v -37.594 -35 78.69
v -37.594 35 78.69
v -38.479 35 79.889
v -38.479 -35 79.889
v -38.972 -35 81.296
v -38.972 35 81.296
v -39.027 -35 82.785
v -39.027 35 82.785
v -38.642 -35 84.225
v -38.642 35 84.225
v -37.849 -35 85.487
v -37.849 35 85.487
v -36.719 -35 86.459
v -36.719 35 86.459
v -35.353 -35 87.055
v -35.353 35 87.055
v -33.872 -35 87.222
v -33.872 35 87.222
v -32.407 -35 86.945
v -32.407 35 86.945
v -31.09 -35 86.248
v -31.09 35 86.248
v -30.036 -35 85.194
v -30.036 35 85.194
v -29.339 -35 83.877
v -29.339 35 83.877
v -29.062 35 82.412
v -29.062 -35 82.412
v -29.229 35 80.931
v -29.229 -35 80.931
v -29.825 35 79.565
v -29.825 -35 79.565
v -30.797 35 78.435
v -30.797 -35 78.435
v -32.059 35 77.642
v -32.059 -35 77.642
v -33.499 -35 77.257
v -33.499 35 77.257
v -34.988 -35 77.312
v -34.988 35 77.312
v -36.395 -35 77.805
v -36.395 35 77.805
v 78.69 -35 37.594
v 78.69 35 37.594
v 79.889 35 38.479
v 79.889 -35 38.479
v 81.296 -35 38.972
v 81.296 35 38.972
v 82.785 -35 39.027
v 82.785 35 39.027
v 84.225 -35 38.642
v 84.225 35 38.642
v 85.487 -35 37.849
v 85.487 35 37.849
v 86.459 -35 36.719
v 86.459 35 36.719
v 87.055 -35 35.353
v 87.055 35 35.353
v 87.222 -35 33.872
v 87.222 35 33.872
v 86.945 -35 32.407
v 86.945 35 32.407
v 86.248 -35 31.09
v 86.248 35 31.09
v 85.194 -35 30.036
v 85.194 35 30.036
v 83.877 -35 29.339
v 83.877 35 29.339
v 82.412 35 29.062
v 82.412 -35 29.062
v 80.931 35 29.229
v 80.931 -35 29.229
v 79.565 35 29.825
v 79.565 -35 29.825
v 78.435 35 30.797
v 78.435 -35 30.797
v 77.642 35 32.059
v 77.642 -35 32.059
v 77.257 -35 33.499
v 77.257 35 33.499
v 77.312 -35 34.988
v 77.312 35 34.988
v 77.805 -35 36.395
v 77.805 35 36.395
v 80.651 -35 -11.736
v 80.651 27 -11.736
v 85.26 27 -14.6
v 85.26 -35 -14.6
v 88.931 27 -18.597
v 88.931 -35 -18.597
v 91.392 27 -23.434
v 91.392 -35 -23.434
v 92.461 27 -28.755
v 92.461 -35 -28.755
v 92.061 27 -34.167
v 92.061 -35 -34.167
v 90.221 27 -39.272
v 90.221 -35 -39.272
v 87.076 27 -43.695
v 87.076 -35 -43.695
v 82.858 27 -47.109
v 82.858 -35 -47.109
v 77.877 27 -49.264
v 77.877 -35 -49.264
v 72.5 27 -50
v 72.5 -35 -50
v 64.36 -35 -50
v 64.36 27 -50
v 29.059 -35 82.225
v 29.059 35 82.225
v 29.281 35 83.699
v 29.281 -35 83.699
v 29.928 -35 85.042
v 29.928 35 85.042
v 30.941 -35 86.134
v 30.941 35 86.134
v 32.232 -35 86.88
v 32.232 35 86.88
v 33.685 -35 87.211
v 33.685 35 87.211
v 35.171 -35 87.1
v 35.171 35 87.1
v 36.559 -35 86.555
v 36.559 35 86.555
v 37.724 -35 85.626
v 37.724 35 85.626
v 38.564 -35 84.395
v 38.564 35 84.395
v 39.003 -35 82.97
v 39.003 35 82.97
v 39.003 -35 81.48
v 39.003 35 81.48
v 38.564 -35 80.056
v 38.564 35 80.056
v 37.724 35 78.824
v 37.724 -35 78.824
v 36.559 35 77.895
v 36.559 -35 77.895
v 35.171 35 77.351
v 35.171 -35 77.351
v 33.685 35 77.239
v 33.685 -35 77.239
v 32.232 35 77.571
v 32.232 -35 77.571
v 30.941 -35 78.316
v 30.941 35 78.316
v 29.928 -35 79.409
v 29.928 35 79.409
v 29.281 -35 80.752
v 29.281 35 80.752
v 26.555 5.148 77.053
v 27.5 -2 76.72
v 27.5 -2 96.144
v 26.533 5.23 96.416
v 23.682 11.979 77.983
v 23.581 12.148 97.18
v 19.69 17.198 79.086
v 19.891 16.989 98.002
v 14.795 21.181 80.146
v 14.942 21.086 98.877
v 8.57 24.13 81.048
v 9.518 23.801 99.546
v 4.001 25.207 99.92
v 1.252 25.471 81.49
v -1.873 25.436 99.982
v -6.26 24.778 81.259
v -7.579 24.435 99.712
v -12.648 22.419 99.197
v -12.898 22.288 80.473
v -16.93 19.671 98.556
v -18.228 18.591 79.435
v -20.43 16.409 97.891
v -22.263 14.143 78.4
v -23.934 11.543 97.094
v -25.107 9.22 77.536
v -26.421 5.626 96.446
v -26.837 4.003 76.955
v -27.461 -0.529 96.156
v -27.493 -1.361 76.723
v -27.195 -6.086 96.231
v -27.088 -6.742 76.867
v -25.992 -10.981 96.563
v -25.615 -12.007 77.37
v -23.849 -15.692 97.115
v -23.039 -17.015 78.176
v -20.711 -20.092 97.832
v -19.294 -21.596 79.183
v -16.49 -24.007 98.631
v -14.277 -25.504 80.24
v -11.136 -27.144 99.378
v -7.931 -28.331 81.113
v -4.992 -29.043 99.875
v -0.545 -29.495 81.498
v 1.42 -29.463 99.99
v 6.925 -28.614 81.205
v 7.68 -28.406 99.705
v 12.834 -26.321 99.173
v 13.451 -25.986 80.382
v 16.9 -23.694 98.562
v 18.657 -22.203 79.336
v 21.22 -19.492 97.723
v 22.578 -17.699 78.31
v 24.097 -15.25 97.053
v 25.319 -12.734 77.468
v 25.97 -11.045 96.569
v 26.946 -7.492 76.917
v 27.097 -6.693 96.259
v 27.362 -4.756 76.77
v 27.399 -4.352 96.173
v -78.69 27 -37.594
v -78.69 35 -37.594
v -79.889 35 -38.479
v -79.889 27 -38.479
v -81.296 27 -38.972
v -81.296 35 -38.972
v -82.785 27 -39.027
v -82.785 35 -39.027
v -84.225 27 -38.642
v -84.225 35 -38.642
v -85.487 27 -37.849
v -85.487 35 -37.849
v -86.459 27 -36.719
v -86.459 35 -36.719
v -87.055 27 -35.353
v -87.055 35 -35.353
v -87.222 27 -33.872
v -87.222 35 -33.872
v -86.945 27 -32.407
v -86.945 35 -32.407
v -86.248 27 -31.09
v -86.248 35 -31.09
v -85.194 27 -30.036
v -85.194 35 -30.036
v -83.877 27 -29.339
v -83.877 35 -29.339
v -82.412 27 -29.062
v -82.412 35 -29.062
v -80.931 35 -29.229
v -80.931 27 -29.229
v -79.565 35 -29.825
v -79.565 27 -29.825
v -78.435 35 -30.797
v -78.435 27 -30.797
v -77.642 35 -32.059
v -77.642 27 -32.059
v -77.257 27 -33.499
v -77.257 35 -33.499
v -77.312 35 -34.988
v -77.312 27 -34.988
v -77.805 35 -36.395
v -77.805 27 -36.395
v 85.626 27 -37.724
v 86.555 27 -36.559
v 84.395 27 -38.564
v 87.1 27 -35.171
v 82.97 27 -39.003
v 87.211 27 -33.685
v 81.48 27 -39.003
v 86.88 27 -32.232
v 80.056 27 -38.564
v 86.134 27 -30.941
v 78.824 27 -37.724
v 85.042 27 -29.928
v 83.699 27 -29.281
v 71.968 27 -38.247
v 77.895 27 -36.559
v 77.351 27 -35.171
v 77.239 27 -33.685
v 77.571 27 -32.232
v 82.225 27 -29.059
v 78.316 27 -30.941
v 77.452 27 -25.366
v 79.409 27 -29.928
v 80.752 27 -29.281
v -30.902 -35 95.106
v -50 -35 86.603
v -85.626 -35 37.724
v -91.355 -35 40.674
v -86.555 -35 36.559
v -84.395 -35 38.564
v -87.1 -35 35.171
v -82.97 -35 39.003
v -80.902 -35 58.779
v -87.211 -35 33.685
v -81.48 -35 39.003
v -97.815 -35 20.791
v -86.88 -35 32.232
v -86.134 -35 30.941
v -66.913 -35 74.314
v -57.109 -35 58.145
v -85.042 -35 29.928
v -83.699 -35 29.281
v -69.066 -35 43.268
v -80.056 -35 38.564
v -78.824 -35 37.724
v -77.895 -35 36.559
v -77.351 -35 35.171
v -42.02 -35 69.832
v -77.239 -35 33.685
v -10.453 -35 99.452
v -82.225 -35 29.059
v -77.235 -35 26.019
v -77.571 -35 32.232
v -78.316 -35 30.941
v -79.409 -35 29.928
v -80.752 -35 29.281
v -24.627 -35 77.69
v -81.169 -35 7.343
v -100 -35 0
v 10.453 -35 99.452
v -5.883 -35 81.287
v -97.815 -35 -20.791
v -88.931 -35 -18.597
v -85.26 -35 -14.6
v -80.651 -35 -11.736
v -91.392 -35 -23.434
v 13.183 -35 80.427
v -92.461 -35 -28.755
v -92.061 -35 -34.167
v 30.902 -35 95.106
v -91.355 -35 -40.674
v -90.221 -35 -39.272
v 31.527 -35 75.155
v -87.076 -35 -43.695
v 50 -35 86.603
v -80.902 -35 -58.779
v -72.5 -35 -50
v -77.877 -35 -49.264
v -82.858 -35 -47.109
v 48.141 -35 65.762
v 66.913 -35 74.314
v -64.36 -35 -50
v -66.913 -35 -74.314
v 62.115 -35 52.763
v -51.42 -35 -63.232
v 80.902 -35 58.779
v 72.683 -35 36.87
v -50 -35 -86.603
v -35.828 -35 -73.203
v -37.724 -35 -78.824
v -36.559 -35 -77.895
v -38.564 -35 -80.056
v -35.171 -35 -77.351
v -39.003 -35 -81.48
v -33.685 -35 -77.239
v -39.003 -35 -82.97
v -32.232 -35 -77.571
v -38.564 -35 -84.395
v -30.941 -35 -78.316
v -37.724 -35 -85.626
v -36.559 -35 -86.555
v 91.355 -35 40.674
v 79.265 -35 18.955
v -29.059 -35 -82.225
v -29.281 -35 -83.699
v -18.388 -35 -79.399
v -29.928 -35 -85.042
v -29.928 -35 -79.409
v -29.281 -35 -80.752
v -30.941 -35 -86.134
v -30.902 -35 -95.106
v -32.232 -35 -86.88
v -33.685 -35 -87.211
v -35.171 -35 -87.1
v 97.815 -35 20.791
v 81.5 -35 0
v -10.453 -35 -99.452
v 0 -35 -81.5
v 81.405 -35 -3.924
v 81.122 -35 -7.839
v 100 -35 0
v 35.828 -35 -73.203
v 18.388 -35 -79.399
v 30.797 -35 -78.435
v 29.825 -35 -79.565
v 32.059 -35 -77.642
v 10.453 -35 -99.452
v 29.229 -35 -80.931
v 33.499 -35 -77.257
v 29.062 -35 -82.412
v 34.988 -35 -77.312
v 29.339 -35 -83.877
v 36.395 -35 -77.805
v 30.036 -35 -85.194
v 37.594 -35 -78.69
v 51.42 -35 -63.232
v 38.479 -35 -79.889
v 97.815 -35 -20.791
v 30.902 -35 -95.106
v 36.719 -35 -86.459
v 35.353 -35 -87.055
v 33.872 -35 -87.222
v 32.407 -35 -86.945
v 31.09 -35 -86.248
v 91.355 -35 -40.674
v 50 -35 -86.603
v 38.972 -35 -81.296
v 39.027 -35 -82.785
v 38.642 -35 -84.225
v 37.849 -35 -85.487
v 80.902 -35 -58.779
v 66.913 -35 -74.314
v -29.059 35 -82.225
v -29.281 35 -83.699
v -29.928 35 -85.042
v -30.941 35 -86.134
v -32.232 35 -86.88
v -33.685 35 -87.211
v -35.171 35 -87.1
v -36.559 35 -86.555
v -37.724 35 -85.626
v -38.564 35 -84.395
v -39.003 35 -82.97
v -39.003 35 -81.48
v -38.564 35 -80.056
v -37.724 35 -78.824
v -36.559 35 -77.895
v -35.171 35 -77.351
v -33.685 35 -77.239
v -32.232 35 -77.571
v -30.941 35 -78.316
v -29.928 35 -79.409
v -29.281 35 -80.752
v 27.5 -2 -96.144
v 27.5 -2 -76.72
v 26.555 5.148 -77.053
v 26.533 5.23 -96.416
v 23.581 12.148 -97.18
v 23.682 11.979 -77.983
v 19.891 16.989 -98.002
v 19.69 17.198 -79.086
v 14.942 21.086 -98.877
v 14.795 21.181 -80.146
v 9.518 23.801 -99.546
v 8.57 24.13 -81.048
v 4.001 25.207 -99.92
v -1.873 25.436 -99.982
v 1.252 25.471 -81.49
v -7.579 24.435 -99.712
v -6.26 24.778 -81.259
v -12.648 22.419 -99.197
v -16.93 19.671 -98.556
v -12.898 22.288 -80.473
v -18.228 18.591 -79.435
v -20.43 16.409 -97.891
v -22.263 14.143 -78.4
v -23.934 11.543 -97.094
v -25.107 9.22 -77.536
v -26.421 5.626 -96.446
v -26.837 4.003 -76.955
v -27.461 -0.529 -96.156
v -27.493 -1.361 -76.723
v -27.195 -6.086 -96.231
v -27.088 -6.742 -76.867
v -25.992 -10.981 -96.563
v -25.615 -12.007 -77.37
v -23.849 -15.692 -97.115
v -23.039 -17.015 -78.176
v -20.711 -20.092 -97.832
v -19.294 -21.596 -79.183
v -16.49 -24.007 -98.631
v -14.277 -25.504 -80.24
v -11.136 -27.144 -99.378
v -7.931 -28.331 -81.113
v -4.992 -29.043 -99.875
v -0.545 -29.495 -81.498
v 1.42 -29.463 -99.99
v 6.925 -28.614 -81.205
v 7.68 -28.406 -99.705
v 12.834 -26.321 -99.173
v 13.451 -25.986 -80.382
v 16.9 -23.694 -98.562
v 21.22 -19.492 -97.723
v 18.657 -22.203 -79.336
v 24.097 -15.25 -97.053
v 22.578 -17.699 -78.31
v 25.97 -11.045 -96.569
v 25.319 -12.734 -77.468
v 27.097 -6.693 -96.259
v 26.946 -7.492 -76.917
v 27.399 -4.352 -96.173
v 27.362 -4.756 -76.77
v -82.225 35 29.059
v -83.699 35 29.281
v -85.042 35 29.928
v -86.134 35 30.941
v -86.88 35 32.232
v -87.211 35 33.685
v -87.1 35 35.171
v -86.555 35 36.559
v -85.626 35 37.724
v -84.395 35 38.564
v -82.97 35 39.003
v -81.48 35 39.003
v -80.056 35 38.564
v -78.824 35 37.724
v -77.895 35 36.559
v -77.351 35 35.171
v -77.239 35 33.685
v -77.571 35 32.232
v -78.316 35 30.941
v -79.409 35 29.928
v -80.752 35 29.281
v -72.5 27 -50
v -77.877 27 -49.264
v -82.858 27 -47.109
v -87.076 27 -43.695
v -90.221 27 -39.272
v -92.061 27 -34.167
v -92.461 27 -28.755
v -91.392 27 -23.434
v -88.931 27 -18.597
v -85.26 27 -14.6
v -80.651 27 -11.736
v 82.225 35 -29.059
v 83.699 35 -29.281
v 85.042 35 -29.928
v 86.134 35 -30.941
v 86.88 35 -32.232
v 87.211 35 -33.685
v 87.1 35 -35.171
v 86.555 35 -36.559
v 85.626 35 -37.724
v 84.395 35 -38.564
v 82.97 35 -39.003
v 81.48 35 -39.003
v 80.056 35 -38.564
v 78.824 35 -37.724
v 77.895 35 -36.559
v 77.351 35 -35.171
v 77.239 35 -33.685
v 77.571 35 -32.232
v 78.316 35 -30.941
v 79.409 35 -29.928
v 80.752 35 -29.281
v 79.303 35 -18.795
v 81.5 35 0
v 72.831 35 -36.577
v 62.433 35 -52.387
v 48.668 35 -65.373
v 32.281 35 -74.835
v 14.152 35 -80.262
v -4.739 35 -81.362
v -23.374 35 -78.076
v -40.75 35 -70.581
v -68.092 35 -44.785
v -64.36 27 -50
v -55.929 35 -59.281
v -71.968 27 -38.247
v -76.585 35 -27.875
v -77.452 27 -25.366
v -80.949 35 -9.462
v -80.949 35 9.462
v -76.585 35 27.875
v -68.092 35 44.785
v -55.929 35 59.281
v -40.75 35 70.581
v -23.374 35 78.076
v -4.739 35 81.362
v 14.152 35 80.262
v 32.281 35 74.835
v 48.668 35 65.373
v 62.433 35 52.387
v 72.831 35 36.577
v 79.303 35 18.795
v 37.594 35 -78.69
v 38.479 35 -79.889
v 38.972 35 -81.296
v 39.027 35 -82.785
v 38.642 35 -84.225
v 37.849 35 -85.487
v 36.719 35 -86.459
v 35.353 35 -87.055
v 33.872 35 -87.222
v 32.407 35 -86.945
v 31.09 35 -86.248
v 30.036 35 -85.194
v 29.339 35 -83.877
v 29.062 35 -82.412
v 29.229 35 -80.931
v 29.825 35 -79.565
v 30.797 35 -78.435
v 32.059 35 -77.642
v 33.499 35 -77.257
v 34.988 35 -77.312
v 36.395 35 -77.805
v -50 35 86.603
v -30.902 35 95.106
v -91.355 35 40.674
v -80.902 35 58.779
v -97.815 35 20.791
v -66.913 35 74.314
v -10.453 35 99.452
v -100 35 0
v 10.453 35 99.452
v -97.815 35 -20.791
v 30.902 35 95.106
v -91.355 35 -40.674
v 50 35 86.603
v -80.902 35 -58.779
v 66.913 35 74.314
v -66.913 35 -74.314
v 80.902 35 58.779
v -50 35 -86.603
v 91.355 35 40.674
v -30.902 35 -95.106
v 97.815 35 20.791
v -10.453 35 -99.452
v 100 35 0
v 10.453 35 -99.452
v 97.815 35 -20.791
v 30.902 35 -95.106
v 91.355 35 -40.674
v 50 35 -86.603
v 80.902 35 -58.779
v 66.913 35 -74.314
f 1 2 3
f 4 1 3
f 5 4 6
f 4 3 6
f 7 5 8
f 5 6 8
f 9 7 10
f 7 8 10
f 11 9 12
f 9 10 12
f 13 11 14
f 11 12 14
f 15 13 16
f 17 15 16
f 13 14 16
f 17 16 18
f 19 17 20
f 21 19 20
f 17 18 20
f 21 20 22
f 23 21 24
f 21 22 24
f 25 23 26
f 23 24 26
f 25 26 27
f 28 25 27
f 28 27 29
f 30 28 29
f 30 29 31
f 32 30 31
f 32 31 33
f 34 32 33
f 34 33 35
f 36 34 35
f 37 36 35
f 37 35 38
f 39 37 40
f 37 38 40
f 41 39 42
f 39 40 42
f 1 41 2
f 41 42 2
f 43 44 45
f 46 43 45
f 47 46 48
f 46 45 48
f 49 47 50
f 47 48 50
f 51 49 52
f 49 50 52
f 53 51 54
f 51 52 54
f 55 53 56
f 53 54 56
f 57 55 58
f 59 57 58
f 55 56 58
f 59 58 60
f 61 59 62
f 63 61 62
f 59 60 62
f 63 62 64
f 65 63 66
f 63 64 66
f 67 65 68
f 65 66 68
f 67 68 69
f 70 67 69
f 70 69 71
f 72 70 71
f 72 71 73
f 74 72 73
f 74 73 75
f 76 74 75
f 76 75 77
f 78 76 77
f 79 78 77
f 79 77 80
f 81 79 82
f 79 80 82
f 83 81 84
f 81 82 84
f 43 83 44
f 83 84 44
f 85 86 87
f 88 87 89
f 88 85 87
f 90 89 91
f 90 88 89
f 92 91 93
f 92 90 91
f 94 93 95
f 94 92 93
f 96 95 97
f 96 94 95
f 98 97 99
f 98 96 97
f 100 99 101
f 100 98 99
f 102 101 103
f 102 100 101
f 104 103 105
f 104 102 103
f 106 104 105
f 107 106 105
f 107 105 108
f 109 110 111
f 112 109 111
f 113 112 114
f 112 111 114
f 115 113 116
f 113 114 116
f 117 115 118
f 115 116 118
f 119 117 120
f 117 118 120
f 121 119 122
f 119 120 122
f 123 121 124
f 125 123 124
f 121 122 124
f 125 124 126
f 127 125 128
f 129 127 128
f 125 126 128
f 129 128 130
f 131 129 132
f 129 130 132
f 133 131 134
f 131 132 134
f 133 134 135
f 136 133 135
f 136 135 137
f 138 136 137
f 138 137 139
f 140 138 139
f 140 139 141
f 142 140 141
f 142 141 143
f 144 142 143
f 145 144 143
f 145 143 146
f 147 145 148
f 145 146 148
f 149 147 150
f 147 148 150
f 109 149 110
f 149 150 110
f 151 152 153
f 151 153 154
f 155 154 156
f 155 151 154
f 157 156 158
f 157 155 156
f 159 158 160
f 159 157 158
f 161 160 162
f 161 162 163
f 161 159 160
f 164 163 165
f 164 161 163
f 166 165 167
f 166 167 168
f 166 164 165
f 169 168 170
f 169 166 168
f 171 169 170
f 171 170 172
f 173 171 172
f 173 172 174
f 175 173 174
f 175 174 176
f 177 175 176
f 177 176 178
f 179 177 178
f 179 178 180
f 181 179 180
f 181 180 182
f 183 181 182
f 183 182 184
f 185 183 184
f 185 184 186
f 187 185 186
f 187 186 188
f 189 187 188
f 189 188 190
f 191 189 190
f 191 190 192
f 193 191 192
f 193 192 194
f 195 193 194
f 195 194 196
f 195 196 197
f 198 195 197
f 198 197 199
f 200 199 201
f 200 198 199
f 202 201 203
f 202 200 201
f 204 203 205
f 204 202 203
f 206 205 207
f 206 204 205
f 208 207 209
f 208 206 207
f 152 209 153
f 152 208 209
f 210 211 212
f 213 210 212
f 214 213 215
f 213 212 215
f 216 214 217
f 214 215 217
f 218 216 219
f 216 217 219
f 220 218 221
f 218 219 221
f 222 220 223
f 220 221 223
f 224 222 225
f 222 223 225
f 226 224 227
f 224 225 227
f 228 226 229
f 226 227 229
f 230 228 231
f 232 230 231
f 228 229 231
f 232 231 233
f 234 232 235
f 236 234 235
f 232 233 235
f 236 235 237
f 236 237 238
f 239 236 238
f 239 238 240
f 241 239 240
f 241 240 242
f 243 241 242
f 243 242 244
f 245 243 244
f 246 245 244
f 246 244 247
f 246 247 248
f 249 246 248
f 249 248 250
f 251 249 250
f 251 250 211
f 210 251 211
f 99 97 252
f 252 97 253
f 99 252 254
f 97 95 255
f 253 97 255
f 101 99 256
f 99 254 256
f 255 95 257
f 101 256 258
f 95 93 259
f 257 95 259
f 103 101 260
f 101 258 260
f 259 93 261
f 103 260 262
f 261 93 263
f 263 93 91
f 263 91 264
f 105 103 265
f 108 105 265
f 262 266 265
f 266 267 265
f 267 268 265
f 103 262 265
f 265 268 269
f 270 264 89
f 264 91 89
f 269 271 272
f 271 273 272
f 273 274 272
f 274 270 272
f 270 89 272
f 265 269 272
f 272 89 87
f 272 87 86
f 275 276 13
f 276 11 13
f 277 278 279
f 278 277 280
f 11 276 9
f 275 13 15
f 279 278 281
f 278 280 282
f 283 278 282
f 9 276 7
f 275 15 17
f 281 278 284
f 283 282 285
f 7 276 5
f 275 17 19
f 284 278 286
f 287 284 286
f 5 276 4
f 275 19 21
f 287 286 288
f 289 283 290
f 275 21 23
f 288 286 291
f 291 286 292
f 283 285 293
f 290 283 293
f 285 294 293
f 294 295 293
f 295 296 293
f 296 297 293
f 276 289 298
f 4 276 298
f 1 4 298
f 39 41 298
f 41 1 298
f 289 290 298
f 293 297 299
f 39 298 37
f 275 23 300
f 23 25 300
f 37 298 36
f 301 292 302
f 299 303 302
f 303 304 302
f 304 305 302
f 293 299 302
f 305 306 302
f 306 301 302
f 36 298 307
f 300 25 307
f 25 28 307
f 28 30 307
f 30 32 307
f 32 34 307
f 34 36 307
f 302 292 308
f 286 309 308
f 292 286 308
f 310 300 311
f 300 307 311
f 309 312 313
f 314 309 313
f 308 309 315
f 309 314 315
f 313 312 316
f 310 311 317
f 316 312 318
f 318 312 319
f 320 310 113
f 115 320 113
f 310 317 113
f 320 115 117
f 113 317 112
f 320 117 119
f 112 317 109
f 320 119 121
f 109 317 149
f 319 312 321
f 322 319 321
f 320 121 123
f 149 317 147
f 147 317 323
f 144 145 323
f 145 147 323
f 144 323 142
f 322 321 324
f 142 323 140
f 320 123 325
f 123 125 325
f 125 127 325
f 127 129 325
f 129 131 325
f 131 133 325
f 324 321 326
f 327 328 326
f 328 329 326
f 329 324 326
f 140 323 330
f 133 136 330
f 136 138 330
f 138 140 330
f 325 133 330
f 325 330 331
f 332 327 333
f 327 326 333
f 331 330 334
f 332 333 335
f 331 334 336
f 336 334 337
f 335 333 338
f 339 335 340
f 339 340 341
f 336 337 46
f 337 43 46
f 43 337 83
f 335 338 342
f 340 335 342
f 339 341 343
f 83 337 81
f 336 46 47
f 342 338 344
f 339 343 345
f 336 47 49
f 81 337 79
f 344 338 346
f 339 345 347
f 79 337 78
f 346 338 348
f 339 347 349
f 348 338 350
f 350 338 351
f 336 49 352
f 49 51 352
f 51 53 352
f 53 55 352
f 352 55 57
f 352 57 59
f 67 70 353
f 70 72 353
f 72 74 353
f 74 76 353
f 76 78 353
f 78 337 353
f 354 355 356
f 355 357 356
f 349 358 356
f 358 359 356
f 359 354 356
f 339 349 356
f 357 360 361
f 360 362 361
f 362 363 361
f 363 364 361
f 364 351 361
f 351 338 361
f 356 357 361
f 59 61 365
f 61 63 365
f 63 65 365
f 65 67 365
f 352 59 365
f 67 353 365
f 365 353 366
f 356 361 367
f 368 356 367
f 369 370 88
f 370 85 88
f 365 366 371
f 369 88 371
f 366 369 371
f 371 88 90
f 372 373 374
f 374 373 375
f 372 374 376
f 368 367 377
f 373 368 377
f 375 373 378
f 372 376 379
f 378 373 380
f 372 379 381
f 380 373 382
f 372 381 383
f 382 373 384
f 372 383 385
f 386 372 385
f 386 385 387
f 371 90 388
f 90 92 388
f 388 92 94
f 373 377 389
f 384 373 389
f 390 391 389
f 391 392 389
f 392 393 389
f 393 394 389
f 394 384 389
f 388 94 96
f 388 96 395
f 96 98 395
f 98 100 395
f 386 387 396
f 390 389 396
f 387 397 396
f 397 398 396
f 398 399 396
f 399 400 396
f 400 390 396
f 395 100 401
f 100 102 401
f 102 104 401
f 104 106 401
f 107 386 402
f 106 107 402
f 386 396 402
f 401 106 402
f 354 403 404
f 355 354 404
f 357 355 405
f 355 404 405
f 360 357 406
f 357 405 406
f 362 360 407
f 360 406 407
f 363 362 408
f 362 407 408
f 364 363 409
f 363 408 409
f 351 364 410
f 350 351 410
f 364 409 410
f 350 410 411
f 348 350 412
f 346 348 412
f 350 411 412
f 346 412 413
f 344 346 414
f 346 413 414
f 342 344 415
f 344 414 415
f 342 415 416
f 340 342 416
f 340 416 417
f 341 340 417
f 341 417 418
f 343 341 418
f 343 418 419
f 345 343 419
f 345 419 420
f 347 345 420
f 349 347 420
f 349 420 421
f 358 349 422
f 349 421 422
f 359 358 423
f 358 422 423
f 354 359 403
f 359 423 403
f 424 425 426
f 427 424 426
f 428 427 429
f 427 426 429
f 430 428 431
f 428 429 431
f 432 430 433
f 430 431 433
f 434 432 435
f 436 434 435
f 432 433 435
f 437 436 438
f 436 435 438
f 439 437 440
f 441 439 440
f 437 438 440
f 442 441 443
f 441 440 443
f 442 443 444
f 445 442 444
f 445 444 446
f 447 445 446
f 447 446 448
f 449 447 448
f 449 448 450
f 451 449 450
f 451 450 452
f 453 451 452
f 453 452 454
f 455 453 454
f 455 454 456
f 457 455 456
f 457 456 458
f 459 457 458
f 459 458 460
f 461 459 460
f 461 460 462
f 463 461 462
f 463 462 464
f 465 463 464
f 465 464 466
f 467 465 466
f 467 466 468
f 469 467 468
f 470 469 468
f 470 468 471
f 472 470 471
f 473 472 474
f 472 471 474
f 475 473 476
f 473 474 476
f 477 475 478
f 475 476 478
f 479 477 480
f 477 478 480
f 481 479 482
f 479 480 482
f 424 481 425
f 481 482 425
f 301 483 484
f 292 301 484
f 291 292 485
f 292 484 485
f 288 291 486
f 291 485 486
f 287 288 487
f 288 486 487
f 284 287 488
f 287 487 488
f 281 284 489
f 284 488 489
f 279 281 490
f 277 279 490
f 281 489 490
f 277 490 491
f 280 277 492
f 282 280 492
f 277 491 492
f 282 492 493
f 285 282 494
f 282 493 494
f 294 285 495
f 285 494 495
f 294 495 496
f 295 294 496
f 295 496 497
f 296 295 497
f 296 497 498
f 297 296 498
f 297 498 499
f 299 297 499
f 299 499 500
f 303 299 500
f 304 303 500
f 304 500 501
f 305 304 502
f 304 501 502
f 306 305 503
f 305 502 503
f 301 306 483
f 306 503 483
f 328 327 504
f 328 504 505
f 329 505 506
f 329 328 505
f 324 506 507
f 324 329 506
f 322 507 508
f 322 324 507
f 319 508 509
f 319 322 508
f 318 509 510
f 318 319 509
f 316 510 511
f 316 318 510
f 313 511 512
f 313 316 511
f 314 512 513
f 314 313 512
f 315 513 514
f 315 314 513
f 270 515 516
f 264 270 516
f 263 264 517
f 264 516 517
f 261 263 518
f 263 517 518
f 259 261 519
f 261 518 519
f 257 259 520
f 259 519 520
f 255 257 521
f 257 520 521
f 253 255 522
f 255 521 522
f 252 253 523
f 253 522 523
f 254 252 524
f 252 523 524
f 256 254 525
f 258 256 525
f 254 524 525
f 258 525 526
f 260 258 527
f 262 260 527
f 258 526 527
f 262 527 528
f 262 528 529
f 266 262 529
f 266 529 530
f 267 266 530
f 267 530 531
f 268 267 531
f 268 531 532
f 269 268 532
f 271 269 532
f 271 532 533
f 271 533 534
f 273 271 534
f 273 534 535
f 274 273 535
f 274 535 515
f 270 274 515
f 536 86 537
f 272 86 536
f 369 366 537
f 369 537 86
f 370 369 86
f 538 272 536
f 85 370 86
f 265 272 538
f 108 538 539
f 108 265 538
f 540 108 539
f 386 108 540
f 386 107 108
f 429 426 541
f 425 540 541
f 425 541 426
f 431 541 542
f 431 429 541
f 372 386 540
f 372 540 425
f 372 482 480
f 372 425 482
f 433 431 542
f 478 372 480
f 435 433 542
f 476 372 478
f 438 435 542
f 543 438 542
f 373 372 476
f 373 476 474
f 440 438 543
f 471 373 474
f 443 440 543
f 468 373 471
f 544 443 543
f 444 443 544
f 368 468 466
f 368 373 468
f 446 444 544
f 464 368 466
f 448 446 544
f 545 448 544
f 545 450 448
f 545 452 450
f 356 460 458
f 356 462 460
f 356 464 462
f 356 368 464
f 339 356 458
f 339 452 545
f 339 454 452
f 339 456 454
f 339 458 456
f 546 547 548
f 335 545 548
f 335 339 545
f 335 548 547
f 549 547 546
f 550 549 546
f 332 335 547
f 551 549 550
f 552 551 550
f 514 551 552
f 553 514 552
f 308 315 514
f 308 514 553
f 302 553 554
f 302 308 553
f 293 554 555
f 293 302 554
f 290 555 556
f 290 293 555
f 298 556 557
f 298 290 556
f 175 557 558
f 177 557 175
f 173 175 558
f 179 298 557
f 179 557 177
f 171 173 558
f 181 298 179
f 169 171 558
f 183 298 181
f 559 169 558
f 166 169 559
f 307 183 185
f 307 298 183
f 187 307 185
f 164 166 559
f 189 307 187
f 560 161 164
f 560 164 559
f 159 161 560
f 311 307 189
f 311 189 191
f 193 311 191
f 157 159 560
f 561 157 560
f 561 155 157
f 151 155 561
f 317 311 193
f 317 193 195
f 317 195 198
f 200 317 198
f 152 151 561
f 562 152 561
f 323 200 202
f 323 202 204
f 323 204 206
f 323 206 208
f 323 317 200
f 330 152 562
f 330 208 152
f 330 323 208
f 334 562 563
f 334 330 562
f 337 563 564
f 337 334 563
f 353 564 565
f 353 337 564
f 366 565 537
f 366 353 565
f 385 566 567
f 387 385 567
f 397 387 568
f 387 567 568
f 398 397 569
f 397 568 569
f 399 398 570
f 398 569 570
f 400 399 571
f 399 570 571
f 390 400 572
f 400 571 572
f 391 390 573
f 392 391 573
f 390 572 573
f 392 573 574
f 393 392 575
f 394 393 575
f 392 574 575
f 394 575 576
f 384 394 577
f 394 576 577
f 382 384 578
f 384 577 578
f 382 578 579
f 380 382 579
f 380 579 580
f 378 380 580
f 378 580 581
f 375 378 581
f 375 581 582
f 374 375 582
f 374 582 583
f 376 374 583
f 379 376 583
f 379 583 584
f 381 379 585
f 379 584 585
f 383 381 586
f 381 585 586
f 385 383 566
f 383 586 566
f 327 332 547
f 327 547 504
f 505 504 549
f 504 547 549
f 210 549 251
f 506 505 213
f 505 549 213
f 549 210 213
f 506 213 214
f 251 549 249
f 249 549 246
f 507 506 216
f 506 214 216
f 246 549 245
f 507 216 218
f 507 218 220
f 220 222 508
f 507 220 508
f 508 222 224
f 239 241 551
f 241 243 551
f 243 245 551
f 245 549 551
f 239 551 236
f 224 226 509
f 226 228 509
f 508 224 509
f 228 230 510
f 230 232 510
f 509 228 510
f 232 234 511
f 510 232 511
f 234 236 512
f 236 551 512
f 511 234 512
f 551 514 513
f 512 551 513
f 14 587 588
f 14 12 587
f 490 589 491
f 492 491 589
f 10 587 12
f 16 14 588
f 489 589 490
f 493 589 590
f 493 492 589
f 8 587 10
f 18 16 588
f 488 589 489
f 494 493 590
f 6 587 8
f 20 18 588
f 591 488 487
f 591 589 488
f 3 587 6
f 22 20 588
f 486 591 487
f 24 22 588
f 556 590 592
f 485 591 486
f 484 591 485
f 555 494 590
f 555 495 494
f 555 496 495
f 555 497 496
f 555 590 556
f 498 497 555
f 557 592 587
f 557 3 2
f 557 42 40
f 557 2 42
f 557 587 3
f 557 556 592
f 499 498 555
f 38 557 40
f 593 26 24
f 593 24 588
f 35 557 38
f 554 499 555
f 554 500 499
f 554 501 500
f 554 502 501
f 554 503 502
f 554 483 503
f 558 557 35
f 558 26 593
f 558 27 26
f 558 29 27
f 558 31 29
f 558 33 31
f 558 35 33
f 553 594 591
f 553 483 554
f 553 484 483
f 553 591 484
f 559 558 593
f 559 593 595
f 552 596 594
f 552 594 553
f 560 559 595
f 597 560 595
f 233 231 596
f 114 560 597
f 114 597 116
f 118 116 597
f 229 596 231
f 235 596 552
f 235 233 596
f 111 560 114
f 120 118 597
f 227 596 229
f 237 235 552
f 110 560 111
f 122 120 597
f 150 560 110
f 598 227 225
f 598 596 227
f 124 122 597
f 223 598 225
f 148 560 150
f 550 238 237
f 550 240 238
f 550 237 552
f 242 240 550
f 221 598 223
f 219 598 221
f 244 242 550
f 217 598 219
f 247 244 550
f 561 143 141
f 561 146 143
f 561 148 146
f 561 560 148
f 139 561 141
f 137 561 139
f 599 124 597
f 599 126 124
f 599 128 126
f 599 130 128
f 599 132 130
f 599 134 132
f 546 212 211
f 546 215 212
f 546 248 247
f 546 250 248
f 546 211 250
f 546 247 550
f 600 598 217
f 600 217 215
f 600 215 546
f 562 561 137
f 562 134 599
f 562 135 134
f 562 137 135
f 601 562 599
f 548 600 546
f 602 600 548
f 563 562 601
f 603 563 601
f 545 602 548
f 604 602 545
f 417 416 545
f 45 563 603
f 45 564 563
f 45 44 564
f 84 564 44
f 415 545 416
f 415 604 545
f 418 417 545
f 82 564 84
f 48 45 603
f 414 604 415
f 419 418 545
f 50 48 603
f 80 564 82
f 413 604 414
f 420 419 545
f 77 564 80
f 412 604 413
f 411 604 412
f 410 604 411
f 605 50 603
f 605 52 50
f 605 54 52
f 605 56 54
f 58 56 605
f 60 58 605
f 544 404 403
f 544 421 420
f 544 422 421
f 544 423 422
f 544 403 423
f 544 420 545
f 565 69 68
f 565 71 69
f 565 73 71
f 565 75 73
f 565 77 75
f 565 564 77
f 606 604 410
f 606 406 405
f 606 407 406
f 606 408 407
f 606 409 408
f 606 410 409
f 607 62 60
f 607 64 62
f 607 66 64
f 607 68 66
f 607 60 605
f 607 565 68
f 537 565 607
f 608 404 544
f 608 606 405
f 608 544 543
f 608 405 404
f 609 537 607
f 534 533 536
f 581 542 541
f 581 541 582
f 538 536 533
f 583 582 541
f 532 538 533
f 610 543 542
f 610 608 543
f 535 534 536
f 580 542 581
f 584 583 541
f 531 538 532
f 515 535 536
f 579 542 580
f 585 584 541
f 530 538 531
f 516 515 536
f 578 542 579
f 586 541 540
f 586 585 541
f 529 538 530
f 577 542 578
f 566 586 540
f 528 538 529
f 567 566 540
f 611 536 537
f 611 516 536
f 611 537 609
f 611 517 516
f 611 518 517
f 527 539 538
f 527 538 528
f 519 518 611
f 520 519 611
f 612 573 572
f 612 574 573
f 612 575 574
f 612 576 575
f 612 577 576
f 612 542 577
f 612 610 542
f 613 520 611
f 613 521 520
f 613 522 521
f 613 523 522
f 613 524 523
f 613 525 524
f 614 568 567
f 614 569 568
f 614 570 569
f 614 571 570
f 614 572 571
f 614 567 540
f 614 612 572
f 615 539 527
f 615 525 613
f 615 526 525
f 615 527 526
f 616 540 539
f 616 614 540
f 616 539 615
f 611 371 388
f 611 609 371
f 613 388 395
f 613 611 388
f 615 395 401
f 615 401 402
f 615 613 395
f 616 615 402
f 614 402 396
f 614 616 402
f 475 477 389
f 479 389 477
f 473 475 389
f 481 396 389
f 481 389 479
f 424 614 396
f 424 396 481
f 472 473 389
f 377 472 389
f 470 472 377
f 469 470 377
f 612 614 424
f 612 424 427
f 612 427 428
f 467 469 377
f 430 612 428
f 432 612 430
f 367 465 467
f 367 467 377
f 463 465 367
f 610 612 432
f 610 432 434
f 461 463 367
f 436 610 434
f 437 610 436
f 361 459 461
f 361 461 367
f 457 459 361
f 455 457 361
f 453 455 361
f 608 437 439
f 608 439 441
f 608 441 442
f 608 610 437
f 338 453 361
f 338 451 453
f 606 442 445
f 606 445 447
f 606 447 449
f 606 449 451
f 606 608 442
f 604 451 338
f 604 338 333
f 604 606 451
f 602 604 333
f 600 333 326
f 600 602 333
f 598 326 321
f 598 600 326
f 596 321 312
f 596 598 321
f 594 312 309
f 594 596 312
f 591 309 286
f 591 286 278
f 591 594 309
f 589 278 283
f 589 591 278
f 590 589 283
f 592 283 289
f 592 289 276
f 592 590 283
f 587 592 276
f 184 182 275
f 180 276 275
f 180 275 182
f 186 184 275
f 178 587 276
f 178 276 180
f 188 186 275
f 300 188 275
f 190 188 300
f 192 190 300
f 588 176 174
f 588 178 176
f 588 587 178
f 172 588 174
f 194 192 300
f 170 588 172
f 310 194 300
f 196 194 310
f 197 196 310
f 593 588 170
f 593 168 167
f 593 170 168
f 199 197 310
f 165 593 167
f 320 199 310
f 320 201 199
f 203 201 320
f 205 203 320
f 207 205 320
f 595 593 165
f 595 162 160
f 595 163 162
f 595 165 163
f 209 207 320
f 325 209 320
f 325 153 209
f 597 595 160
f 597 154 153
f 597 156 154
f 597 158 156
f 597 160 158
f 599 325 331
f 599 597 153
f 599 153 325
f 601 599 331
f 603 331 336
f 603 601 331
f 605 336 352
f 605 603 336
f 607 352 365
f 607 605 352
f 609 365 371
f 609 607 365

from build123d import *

# Parameters (mm, degrees)
SKETCH1_R               = 100
SKETCH1_R_2             = 81.5
BOSS_EXTRUDE1_DEPTH     = 35
SKETCH3_R               = 27.5
CUT_EXTRUDE1_DEPTH      = 101
CUT_EXTRUDE1_DEPTH_BACK = 101
SKETCH4_R               = 5
CUT_EXTRUDE2_DEPTH      = 70
CIRPATTERN1_COUNT       = 8
CUT_EXTRUDE3_DEPTH      = 62


with BuildPart() as part:
    # Sketch1 → Boss-Extrude1 (new body, symmetric)
    with BuildSketch(Plane(origin=(0, 0, 0), x_dir=(1, 0, 0), z_dir=(0, 1, 0))):
        Circle(SKETCH1_R)
        Circle(SKETCH1_R_2, mode=Mode.SUBTRACT)
    extrude(amount=BOSS_EXTRUDE1_DEPTH, both=True)

    # Sketch3 → Cut-Extrude1 (cut, two sides)
    with BuildSketch(Plane.XY) as cut_extrude1_sk:
        with Locations((0, -2)):
            Circle(SKETCH3_R)
    extrude(amount=CUT_EXTRUDE1_DEPTH, mode=Mode.SUBTRACT)
    extrude(cut_extrude1_sk.sketch, amount=-CUT_EXTRUDE1_DEPTH_BACK, mode=Mode.SUBTRACT)

    # Sketch4 → Cut-Extrude2 (cut)
    with BuildSketch(Plane(origin=(0, 35, 0), x_dir=(1, 0, 0), z_dir=(0, 1, 0))):
        with Locations((-34.05882548, 82.225278394)):
            Circle(SKETCH4_R)
    cut_extrude2 = extrude(amount=-CUT_EXTRUDE2_DEPTH, mode=Mode.SUBTRACT)

    # CirPattern1: Cut-Extrude2 ×8 about axis
    cirpattern1_axis = Axis((0, 0, 0), (0, 1, 0))
    for i in range(1, CIRPATTERN1_COUNT):
        add(cut_extrude2.rotate(cirpattern1_axis, i * 360 / CIRPATTERN1_COUNT), mode=Mode.SUBTRACT)

    # Sketch5 → Cut-Extrude3 (cut)
    with BuildSketch(Plane.XZ.offset(35)):
        with BuildLine():
            Line((-72.5, -10), (72.5, -10))
            ThreePointArc((72.5, -10), (92.5, -30), (72.5, -50))
            Line((72.5, -50), (-72.5, -50))
            ThreePointArc((-72.5, -50), (-92.5, -30), (-72.5, -10))
        make_face()
    extrude(amount=-CUT_EXTRUDE3_DEPTH, mode=Mode.SUBTRACT)


solid = part.part
